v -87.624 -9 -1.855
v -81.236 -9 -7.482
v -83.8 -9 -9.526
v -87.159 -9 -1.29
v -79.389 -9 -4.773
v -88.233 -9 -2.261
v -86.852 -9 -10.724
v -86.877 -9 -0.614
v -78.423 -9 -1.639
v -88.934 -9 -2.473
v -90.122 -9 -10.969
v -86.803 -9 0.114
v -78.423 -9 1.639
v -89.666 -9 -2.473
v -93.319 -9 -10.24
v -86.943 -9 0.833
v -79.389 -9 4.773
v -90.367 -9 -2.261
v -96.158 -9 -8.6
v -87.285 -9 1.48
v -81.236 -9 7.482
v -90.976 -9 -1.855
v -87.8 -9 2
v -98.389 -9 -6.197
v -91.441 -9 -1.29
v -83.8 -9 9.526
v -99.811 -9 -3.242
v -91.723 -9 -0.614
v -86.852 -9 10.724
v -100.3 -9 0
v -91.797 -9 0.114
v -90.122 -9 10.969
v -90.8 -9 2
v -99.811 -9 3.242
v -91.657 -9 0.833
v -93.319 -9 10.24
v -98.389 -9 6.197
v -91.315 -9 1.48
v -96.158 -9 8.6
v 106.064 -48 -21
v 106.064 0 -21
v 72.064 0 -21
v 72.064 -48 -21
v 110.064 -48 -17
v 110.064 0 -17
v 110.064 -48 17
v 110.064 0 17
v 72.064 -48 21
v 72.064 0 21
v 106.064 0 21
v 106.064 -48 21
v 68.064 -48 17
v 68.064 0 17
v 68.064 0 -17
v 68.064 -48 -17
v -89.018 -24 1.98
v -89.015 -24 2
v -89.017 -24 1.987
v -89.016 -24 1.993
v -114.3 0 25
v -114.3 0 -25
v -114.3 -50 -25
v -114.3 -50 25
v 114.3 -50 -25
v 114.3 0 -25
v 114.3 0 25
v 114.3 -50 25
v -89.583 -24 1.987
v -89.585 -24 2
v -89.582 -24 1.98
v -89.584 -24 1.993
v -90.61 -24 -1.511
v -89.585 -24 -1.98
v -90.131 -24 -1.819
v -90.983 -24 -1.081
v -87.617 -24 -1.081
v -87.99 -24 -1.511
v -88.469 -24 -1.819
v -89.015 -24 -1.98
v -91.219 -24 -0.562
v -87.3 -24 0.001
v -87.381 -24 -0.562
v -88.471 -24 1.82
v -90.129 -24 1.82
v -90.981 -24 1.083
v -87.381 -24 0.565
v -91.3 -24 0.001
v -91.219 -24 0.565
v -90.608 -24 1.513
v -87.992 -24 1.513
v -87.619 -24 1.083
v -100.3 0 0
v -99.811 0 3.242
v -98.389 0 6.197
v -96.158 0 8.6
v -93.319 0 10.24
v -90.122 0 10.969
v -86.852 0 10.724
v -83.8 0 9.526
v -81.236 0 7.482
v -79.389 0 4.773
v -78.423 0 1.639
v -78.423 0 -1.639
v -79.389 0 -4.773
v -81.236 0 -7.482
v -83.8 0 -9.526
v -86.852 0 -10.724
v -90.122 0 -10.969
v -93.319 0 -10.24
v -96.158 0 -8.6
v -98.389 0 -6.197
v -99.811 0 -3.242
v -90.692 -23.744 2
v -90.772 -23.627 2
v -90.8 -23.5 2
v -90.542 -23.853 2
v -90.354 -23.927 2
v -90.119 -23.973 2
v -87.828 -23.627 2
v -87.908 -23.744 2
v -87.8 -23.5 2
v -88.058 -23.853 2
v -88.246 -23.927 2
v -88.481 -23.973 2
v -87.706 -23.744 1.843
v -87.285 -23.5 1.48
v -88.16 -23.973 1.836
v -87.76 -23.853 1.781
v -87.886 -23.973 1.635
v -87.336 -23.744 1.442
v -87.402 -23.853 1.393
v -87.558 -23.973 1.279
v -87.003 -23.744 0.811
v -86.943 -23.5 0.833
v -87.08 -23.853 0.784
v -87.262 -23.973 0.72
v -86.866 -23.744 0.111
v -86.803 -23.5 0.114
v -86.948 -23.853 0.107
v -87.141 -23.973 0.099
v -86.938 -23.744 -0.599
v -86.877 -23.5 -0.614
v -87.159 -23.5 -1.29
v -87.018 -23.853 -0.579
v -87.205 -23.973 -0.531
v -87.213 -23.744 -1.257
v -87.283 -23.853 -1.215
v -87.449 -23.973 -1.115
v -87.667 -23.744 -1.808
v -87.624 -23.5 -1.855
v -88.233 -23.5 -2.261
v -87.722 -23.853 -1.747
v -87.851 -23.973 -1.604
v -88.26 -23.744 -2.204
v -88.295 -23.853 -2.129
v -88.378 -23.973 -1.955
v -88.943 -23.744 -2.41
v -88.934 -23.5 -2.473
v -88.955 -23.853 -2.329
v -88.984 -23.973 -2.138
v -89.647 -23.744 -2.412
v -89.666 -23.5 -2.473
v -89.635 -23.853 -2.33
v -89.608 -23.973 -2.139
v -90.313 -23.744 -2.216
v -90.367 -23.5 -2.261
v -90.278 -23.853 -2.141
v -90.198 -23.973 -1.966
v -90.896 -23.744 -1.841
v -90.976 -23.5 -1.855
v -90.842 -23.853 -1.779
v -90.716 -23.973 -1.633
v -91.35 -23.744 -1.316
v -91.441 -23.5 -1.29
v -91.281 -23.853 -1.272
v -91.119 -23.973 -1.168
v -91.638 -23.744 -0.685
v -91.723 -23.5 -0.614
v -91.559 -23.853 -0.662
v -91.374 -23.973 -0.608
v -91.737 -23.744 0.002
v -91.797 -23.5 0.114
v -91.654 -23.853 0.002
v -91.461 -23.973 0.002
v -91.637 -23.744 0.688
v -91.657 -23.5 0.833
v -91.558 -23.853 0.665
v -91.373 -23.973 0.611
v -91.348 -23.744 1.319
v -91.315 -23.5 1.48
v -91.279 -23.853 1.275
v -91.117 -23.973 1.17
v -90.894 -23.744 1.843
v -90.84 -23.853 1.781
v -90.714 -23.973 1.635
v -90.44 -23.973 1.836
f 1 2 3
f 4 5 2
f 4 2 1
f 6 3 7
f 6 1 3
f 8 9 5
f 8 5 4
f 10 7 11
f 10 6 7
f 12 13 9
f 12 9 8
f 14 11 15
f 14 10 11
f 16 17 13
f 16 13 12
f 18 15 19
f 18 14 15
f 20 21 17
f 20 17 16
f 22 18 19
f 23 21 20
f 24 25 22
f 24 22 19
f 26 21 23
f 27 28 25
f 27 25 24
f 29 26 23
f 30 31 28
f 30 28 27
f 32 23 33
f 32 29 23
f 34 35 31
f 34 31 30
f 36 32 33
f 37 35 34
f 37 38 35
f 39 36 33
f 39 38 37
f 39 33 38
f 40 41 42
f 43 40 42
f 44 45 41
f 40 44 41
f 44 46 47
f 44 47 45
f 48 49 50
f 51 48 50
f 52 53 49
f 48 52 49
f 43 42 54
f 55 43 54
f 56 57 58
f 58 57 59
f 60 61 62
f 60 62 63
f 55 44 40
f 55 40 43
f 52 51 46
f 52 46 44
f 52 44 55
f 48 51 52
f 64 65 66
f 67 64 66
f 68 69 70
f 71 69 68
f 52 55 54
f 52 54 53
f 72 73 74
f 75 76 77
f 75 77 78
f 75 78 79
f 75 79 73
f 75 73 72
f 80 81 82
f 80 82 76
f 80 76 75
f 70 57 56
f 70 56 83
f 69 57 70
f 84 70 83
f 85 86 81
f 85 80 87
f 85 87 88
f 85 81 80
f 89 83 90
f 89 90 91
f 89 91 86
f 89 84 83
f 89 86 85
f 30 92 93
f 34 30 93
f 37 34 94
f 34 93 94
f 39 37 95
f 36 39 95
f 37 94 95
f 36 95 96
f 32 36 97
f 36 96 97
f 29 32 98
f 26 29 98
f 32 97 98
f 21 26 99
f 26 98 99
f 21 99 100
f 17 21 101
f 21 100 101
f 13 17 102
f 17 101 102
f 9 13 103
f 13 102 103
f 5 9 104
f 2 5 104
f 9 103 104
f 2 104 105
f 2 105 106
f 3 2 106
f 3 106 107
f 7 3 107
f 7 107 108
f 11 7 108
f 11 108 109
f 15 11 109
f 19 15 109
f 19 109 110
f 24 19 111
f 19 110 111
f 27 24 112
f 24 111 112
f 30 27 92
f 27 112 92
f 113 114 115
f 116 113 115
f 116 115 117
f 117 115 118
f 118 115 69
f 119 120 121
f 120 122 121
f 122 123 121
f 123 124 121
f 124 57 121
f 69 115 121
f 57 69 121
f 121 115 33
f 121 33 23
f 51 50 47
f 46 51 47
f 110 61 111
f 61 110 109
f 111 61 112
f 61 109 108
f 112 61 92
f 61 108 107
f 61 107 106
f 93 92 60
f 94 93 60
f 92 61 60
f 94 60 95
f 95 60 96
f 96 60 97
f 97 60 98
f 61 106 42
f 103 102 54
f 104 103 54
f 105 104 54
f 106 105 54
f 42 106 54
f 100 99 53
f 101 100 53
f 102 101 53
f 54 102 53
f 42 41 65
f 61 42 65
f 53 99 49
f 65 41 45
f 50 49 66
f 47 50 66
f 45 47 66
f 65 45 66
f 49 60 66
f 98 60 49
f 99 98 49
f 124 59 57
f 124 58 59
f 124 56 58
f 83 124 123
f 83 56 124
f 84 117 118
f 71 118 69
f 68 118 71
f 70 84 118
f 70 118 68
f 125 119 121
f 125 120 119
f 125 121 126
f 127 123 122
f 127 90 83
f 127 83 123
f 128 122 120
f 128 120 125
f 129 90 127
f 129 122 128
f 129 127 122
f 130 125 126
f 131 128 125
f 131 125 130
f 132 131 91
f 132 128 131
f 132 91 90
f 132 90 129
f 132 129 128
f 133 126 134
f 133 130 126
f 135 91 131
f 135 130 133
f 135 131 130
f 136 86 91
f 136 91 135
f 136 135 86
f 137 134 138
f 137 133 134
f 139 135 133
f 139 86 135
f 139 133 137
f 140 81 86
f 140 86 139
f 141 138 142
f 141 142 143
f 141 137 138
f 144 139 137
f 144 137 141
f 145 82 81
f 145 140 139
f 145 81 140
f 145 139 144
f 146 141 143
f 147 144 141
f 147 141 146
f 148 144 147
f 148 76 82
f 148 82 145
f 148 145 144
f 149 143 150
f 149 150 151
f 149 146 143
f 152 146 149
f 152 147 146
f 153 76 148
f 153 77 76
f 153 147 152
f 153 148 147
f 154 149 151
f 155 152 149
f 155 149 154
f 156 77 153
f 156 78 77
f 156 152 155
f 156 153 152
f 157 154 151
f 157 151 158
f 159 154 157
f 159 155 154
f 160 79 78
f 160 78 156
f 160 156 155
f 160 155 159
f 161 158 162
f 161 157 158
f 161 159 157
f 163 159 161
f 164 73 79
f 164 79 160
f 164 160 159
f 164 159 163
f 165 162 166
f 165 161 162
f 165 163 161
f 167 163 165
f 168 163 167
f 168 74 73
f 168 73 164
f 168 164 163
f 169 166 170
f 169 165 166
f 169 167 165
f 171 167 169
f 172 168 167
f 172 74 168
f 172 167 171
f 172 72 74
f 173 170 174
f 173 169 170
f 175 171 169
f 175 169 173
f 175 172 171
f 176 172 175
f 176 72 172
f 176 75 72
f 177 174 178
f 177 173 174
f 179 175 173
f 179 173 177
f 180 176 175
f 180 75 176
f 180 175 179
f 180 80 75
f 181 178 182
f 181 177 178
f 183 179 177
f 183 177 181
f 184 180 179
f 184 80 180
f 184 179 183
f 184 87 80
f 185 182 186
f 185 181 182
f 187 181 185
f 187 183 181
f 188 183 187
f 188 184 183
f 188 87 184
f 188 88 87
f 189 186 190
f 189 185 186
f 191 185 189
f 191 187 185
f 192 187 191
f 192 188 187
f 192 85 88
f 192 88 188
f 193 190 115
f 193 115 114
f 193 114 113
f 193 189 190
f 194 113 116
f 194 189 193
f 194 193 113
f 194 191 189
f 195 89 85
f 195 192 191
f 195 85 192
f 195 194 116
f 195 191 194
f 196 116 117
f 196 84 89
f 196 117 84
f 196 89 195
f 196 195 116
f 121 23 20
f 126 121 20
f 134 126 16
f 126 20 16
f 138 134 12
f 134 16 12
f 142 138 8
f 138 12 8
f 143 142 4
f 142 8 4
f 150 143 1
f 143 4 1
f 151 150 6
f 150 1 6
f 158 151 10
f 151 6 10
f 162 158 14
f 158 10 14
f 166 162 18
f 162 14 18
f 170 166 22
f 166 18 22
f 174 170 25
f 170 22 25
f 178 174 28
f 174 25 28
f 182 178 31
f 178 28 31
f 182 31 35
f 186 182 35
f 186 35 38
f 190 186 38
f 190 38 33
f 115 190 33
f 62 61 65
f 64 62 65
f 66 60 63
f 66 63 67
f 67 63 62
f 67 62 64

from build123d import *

# Parameters (mm, degrees)
F0_W        = 228.6
F0_H        = 50
F1_DEPTH    = 50
F3_DEPTH    = 48
F4_R        = 11
F5_DEPTH    = 9
F7_DEPTH    = 15
F8_T2_ANGLE = 343.7894292622


# Not quite as in the source:
# - a fillet or chamfer that OpenCascade refuses, or shapes differently, is made with other operations: its cross-section is extruded or revolved along the edge and cut away or added


with BuildPart() as f1:
    # F0 (on Front) → F1 (new body)
    with BuildSketch(Plane.XZ):
        Rectangle(F0_W, F0_H)
    extrude(amount=F1_DEPTH)

    # F2 (on face) → F3 (cut)
    with BuildSketch(Plane(origin=(0, 0, 0), x_dir=(-1, 0, 0), z_dir=(0, 1, 0))):
        Polygon((-106.0638769388, 21.0001030612), (-110.06398, 17), (-110.06398, -17), (-106.0638769388, -21.0001030612), (-72.0638769388, -21.0001030612), (-68.0637738777, -17), (-68.0637738777, 17), (-72.0638769388, 21.0001030612), align=None)
    extrude(amount=-F3_DEPTH, mode=Mode.SUBTRACT)

    # F4 (on face) → F5 (cut)
    with BuildSketch(Plane(origin=(0, 0, 0), x_dir=(-1, 0, 0), z_dir=(0, 1, 0))):
        with Locations((89.3, 0)):
            Circle(F4_R)
    extrude(amount=-F5_DEPTH, mode=Mode.SUBTRACT)

    # F6 (on face) → F7 (cut)
    with BuildSketch(Plane(origin=(0, -9, 0), x_dir=(-1, 0, 0), z_dir=(0, 1, 0))):
        with BuildLine():
            Line((90.8, 2), (87.8, 2))
            ThreePointArc((87.8, 2), (89.3, -2.5), (90.8, 2))
        make_face()
    extrude(amount=-F7_DEPTH, mode=Mode.SUBTRACT)

    # F8: fillet of radius 0.5 on 1 edges, made by hand

    # F8_s1 → F8_t2 (revolve)
    with BuildSketch(Plane(origin=(-87.5248141005, 0, 12.4648632504), x_dir=(0, 1, 0), z_dir=(-0.9900106558, 0, 0.1409925581))):
        with BuildLine():
            ThreePointArc((-23.5, 10.0906354418), (-23.8535533906, 10.2370820512), (-24, 10.5906354418))
            Line((-24, 10.5906354418), (-24, 10.0906354418))
            Line((-24, 10.0906354418), (-23.5, 10.0906354418))
        make_face()
    revolve(axis=Axis((-89.3, -24, 0), (0, 1, 0)), revolution_arc=F8_T2_ANGLE)


solid = f1.part
